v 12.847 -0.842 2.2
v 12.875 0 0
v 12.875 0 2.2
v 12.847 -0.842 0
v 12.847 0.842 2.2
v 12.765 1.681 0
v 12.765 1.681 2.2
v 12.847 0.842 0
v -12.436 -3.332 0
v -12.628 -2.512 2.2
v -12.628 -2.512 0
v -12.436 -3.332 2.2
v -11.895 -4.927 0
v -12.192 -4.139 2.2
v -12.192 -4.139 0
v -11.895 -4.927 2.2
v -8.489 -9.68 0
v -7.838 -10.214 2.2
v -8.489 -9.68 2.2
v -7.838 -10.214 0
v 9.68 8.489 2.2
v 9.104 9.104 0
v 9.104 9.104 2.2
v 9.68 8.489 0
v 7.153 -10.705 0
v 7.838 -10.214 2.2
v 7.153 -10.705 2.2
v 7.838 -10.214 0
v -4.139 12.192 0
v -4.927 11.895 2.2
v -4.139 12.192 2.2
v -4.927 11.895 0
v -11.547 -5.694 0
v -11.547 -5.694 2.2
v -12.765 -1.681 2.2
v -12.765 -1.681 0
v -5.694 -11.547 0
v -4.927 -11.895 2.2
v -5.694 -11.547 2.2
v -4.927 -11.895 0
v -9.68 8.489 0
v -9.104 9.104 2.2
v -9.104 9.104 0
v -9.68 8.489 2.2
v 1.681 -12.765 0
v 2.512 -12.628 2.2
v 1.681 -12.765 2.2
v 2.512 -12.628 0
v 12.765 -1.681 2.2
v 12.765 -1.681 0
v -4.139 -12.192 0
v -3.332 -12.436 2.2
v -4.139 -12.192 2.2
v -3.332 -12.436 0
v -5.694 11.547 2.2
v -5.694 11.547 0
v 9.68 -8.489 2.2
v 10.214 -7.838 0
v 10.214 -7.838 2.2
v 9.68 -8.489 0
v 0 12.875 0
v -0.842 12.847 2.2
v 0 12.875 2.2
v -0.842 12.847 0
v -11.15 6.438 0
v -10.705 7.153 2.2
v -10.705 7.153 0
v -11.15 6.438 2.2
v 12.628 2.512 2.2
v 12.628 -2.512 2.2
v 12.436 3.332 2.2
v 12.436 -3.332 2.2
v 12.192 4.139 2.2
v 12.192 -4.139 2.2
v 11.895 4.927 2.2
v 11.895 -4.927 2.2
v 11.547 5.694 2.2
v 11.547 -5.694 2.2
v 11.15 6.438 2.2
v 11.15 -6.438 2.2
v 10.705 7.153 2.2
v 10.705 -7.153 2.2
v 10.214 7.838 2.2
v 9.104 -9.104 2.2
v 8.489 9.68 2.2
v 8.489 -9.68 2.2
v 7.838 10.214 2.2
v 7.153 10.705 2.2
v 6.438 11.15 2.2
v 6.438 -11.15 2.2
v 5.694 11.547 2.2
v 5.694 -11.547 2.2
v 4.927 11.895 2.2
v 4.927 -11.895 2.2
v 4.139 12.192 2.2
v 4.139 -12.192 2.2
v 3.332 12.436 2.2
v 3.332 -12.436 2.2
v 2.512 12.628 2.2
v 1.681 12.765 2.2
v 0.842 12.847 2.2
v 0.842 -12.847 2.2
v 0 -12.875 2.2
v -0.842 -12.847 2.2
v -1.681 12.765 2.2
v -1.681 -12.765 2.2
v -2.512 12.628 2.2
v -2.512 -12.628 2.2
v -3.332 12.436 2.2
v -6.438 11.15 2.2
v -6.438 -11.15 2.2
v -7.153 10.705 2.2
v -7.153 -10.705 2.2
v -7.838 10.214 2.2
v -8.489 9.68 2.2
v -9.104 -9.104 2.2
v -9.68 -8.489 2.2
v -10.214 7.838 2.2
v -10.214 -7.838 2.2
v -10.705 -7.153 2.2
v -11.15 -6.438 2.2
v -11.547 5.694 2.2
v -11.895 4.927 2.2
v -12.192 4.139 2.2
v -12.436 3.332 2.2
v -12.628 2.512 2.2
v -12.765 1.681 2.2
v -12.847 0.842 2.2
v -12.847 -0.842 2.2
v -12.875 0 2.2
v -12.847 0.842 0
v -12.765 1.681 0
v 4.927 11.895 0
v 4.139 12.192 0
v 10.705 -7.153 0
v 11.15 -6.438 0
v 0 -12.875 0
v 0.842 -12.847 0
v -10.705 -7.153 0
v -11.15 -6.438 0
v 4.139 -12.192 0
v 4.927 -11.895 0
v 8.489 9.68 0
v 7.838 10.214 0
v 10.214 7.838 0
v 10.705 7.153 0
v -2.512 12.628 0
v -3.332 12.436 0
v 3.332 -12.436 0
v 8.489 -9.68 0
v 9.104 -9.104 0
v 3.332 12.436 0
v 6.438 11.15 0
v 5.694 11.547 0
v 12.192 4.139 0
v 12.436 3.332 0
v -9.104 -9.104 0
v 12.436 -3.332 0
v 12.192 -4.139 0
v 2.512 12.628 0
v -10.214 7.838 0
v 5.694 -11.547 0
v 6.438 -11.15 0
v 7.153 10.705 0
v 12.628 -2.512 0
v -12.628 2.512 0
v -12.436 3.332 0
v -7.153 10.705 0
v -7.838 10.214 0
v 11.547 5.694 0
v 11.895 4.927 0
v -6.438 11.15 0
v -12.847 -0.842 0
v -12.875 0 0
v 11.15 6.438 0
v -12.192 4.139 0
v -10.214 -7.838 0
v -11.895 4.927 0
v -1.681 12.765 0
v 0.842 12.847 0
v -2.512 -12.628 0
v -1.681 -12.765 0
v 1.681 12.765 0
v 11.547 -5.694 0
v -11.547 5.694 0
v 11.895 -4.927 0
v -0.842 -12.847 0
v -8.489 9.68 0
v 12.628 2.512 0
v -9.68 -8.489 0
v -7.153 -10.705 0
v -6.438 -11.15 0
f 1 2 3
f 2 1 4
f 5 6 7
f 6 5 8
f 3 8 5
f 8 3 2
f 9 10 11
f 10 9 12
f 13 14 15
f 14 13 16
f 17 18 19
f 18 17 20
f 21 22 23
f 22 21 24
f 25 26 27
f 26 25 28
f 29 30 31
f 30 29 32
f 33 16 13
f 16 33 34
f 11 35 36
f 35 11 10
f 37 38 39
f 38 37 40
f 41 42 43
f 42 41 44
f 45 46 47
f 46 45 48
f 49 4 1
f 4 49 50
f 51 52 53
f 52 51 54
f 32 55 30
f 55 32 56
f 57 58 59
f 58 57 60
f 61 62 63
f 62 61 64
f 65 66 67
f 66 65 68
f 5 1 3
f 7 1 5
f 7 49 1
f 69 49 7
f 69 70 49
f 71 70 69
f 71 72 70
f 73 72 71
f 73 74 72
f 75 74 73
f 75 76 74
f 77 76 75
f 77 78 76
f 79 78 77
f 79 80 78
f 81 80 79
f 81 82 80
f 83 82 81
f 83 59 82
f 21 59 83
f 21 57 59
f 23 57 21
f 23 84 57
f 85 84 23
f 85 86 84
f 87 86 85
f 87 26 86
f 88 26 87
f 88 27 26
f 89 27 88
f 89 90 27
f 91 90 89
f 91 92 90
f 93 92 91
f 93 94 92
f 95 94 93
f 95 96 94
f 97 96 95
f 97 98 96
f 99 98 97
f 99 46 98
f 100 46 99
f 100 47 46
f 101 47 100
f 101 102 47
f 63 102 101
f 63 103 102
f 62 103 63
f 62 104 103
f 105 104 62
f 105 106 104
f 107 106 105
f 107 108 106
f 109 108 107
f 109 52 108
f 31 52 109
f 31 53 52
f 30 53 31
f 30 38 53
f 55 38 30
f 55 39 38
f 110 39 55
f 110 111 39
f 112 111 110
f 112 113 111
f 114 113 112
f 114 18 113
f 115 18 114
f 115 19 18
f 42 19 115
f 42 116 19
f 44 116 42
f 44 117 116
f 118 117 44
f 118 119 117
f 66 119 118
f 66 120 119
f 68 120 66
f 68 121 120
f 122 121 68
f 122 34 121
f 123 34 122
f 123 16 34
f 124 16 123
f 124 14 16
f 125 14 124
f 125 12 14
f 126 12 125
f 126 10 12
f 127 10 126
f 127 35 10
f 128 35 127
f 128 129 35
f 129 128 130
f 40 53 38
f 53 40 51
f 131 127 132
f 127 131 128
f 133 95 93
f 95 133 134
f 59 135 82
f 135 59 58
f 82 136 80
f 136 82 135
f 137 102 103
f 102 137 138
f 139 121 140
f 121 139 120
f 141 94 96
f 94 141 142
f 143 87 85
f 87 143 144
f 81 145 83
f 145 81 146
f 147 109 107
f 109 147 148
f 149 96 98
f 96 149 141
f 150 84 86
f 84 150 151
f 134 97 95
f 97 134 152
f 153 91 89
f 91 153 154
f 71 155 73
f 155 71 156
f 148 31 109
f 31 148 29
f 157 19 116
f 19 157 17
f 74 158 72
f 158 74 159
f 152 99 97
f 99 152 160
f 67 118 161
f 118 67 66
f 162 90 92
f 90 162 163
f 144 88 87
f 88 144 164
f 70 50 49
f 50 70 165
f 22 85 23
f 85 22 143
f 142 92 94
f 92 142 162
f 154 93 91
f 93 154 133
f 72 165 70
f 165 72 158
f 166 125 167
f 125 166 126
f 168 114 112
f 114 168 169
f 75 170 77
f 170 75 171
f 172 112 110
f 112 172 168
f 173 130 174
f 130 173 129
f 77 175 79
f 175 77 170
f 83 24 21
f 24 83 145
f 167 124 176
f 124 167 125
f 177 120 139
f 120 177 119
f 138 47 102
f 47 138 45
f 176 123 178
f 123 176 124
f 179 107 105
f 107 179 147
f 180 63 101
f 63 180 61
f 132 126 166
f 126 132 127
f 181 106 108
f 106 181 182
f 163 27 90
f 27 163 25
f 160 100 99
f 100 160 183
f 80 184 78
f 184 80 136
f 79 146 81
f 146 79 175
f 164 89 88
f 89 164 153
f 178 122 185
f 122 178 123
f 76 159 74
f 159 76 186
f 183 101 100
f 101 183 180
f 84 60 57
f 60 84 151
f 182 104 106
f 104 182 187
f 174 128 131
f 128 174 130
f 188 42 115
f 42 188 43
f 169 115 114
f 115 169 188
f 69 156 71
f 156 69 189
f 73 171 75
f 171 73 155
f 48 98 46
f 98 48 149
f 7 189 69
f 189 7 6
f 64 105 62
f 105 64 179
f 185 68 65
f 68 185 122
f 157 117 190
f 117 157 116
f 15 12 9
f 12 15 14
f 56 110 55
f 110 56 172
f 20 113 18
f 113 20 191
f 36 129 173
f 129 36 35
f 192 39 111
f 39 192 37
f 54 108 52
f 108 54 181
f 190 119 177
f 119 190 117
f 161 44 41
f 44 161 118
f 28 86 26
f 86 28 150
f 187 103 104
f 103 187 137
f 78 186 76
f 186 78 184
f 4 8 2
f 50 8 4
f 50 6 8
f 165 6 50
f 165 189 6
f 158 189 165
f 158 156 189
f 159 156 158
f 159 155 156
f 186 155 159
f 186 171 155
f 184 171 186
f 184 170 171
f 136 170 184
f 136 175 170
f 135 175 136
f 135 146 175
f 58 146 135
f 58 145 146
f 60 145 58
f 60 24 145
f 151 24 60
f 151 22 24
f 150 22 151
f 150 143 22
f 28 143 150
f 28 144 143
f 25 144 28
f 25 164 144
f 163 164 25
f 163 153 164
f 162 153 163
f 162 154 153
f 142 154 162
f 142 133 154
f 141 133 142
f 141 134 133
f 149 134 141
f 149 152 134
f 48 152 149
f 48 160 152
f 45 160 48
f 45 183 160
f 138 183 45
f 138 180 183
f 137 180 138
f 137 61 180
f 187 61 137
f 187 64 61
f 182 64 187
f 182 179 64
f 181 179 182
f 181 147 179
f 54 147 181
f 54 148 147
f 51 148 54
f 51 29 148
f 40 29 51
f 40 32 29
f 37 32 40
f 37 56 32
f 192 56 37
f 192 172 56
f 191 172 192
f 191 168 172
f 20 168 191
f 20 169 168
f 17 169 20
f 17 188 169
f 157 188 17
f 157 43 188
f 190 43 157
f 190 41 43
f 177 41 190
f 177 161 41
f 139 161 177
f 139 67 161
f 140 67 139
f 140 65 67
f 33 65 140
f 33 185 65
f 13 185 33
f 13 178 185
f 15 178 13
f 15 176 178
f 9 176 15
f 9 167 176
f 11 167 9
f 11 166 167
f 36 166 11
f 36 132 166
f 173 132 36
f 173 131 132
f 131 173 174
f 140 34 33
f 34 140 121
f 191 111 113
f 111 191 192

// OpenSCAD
// €2 coin (Ø25.75 × 2.2 mm, centre Ø18.75), lying flat on Z = 0: scale reference in the renders.
module euro2() {
  color("Silver") difference() { cylinder(d = 25.75, h = 2.2, $fn = 96); translate([0, 0, -0.1]) cylinder(d = 18.75, h = 2.4, $fn = 96); }
  color("Gold") cylinder(d = 18.75, h = 2.2, $fn = 96);
}

euro2();
